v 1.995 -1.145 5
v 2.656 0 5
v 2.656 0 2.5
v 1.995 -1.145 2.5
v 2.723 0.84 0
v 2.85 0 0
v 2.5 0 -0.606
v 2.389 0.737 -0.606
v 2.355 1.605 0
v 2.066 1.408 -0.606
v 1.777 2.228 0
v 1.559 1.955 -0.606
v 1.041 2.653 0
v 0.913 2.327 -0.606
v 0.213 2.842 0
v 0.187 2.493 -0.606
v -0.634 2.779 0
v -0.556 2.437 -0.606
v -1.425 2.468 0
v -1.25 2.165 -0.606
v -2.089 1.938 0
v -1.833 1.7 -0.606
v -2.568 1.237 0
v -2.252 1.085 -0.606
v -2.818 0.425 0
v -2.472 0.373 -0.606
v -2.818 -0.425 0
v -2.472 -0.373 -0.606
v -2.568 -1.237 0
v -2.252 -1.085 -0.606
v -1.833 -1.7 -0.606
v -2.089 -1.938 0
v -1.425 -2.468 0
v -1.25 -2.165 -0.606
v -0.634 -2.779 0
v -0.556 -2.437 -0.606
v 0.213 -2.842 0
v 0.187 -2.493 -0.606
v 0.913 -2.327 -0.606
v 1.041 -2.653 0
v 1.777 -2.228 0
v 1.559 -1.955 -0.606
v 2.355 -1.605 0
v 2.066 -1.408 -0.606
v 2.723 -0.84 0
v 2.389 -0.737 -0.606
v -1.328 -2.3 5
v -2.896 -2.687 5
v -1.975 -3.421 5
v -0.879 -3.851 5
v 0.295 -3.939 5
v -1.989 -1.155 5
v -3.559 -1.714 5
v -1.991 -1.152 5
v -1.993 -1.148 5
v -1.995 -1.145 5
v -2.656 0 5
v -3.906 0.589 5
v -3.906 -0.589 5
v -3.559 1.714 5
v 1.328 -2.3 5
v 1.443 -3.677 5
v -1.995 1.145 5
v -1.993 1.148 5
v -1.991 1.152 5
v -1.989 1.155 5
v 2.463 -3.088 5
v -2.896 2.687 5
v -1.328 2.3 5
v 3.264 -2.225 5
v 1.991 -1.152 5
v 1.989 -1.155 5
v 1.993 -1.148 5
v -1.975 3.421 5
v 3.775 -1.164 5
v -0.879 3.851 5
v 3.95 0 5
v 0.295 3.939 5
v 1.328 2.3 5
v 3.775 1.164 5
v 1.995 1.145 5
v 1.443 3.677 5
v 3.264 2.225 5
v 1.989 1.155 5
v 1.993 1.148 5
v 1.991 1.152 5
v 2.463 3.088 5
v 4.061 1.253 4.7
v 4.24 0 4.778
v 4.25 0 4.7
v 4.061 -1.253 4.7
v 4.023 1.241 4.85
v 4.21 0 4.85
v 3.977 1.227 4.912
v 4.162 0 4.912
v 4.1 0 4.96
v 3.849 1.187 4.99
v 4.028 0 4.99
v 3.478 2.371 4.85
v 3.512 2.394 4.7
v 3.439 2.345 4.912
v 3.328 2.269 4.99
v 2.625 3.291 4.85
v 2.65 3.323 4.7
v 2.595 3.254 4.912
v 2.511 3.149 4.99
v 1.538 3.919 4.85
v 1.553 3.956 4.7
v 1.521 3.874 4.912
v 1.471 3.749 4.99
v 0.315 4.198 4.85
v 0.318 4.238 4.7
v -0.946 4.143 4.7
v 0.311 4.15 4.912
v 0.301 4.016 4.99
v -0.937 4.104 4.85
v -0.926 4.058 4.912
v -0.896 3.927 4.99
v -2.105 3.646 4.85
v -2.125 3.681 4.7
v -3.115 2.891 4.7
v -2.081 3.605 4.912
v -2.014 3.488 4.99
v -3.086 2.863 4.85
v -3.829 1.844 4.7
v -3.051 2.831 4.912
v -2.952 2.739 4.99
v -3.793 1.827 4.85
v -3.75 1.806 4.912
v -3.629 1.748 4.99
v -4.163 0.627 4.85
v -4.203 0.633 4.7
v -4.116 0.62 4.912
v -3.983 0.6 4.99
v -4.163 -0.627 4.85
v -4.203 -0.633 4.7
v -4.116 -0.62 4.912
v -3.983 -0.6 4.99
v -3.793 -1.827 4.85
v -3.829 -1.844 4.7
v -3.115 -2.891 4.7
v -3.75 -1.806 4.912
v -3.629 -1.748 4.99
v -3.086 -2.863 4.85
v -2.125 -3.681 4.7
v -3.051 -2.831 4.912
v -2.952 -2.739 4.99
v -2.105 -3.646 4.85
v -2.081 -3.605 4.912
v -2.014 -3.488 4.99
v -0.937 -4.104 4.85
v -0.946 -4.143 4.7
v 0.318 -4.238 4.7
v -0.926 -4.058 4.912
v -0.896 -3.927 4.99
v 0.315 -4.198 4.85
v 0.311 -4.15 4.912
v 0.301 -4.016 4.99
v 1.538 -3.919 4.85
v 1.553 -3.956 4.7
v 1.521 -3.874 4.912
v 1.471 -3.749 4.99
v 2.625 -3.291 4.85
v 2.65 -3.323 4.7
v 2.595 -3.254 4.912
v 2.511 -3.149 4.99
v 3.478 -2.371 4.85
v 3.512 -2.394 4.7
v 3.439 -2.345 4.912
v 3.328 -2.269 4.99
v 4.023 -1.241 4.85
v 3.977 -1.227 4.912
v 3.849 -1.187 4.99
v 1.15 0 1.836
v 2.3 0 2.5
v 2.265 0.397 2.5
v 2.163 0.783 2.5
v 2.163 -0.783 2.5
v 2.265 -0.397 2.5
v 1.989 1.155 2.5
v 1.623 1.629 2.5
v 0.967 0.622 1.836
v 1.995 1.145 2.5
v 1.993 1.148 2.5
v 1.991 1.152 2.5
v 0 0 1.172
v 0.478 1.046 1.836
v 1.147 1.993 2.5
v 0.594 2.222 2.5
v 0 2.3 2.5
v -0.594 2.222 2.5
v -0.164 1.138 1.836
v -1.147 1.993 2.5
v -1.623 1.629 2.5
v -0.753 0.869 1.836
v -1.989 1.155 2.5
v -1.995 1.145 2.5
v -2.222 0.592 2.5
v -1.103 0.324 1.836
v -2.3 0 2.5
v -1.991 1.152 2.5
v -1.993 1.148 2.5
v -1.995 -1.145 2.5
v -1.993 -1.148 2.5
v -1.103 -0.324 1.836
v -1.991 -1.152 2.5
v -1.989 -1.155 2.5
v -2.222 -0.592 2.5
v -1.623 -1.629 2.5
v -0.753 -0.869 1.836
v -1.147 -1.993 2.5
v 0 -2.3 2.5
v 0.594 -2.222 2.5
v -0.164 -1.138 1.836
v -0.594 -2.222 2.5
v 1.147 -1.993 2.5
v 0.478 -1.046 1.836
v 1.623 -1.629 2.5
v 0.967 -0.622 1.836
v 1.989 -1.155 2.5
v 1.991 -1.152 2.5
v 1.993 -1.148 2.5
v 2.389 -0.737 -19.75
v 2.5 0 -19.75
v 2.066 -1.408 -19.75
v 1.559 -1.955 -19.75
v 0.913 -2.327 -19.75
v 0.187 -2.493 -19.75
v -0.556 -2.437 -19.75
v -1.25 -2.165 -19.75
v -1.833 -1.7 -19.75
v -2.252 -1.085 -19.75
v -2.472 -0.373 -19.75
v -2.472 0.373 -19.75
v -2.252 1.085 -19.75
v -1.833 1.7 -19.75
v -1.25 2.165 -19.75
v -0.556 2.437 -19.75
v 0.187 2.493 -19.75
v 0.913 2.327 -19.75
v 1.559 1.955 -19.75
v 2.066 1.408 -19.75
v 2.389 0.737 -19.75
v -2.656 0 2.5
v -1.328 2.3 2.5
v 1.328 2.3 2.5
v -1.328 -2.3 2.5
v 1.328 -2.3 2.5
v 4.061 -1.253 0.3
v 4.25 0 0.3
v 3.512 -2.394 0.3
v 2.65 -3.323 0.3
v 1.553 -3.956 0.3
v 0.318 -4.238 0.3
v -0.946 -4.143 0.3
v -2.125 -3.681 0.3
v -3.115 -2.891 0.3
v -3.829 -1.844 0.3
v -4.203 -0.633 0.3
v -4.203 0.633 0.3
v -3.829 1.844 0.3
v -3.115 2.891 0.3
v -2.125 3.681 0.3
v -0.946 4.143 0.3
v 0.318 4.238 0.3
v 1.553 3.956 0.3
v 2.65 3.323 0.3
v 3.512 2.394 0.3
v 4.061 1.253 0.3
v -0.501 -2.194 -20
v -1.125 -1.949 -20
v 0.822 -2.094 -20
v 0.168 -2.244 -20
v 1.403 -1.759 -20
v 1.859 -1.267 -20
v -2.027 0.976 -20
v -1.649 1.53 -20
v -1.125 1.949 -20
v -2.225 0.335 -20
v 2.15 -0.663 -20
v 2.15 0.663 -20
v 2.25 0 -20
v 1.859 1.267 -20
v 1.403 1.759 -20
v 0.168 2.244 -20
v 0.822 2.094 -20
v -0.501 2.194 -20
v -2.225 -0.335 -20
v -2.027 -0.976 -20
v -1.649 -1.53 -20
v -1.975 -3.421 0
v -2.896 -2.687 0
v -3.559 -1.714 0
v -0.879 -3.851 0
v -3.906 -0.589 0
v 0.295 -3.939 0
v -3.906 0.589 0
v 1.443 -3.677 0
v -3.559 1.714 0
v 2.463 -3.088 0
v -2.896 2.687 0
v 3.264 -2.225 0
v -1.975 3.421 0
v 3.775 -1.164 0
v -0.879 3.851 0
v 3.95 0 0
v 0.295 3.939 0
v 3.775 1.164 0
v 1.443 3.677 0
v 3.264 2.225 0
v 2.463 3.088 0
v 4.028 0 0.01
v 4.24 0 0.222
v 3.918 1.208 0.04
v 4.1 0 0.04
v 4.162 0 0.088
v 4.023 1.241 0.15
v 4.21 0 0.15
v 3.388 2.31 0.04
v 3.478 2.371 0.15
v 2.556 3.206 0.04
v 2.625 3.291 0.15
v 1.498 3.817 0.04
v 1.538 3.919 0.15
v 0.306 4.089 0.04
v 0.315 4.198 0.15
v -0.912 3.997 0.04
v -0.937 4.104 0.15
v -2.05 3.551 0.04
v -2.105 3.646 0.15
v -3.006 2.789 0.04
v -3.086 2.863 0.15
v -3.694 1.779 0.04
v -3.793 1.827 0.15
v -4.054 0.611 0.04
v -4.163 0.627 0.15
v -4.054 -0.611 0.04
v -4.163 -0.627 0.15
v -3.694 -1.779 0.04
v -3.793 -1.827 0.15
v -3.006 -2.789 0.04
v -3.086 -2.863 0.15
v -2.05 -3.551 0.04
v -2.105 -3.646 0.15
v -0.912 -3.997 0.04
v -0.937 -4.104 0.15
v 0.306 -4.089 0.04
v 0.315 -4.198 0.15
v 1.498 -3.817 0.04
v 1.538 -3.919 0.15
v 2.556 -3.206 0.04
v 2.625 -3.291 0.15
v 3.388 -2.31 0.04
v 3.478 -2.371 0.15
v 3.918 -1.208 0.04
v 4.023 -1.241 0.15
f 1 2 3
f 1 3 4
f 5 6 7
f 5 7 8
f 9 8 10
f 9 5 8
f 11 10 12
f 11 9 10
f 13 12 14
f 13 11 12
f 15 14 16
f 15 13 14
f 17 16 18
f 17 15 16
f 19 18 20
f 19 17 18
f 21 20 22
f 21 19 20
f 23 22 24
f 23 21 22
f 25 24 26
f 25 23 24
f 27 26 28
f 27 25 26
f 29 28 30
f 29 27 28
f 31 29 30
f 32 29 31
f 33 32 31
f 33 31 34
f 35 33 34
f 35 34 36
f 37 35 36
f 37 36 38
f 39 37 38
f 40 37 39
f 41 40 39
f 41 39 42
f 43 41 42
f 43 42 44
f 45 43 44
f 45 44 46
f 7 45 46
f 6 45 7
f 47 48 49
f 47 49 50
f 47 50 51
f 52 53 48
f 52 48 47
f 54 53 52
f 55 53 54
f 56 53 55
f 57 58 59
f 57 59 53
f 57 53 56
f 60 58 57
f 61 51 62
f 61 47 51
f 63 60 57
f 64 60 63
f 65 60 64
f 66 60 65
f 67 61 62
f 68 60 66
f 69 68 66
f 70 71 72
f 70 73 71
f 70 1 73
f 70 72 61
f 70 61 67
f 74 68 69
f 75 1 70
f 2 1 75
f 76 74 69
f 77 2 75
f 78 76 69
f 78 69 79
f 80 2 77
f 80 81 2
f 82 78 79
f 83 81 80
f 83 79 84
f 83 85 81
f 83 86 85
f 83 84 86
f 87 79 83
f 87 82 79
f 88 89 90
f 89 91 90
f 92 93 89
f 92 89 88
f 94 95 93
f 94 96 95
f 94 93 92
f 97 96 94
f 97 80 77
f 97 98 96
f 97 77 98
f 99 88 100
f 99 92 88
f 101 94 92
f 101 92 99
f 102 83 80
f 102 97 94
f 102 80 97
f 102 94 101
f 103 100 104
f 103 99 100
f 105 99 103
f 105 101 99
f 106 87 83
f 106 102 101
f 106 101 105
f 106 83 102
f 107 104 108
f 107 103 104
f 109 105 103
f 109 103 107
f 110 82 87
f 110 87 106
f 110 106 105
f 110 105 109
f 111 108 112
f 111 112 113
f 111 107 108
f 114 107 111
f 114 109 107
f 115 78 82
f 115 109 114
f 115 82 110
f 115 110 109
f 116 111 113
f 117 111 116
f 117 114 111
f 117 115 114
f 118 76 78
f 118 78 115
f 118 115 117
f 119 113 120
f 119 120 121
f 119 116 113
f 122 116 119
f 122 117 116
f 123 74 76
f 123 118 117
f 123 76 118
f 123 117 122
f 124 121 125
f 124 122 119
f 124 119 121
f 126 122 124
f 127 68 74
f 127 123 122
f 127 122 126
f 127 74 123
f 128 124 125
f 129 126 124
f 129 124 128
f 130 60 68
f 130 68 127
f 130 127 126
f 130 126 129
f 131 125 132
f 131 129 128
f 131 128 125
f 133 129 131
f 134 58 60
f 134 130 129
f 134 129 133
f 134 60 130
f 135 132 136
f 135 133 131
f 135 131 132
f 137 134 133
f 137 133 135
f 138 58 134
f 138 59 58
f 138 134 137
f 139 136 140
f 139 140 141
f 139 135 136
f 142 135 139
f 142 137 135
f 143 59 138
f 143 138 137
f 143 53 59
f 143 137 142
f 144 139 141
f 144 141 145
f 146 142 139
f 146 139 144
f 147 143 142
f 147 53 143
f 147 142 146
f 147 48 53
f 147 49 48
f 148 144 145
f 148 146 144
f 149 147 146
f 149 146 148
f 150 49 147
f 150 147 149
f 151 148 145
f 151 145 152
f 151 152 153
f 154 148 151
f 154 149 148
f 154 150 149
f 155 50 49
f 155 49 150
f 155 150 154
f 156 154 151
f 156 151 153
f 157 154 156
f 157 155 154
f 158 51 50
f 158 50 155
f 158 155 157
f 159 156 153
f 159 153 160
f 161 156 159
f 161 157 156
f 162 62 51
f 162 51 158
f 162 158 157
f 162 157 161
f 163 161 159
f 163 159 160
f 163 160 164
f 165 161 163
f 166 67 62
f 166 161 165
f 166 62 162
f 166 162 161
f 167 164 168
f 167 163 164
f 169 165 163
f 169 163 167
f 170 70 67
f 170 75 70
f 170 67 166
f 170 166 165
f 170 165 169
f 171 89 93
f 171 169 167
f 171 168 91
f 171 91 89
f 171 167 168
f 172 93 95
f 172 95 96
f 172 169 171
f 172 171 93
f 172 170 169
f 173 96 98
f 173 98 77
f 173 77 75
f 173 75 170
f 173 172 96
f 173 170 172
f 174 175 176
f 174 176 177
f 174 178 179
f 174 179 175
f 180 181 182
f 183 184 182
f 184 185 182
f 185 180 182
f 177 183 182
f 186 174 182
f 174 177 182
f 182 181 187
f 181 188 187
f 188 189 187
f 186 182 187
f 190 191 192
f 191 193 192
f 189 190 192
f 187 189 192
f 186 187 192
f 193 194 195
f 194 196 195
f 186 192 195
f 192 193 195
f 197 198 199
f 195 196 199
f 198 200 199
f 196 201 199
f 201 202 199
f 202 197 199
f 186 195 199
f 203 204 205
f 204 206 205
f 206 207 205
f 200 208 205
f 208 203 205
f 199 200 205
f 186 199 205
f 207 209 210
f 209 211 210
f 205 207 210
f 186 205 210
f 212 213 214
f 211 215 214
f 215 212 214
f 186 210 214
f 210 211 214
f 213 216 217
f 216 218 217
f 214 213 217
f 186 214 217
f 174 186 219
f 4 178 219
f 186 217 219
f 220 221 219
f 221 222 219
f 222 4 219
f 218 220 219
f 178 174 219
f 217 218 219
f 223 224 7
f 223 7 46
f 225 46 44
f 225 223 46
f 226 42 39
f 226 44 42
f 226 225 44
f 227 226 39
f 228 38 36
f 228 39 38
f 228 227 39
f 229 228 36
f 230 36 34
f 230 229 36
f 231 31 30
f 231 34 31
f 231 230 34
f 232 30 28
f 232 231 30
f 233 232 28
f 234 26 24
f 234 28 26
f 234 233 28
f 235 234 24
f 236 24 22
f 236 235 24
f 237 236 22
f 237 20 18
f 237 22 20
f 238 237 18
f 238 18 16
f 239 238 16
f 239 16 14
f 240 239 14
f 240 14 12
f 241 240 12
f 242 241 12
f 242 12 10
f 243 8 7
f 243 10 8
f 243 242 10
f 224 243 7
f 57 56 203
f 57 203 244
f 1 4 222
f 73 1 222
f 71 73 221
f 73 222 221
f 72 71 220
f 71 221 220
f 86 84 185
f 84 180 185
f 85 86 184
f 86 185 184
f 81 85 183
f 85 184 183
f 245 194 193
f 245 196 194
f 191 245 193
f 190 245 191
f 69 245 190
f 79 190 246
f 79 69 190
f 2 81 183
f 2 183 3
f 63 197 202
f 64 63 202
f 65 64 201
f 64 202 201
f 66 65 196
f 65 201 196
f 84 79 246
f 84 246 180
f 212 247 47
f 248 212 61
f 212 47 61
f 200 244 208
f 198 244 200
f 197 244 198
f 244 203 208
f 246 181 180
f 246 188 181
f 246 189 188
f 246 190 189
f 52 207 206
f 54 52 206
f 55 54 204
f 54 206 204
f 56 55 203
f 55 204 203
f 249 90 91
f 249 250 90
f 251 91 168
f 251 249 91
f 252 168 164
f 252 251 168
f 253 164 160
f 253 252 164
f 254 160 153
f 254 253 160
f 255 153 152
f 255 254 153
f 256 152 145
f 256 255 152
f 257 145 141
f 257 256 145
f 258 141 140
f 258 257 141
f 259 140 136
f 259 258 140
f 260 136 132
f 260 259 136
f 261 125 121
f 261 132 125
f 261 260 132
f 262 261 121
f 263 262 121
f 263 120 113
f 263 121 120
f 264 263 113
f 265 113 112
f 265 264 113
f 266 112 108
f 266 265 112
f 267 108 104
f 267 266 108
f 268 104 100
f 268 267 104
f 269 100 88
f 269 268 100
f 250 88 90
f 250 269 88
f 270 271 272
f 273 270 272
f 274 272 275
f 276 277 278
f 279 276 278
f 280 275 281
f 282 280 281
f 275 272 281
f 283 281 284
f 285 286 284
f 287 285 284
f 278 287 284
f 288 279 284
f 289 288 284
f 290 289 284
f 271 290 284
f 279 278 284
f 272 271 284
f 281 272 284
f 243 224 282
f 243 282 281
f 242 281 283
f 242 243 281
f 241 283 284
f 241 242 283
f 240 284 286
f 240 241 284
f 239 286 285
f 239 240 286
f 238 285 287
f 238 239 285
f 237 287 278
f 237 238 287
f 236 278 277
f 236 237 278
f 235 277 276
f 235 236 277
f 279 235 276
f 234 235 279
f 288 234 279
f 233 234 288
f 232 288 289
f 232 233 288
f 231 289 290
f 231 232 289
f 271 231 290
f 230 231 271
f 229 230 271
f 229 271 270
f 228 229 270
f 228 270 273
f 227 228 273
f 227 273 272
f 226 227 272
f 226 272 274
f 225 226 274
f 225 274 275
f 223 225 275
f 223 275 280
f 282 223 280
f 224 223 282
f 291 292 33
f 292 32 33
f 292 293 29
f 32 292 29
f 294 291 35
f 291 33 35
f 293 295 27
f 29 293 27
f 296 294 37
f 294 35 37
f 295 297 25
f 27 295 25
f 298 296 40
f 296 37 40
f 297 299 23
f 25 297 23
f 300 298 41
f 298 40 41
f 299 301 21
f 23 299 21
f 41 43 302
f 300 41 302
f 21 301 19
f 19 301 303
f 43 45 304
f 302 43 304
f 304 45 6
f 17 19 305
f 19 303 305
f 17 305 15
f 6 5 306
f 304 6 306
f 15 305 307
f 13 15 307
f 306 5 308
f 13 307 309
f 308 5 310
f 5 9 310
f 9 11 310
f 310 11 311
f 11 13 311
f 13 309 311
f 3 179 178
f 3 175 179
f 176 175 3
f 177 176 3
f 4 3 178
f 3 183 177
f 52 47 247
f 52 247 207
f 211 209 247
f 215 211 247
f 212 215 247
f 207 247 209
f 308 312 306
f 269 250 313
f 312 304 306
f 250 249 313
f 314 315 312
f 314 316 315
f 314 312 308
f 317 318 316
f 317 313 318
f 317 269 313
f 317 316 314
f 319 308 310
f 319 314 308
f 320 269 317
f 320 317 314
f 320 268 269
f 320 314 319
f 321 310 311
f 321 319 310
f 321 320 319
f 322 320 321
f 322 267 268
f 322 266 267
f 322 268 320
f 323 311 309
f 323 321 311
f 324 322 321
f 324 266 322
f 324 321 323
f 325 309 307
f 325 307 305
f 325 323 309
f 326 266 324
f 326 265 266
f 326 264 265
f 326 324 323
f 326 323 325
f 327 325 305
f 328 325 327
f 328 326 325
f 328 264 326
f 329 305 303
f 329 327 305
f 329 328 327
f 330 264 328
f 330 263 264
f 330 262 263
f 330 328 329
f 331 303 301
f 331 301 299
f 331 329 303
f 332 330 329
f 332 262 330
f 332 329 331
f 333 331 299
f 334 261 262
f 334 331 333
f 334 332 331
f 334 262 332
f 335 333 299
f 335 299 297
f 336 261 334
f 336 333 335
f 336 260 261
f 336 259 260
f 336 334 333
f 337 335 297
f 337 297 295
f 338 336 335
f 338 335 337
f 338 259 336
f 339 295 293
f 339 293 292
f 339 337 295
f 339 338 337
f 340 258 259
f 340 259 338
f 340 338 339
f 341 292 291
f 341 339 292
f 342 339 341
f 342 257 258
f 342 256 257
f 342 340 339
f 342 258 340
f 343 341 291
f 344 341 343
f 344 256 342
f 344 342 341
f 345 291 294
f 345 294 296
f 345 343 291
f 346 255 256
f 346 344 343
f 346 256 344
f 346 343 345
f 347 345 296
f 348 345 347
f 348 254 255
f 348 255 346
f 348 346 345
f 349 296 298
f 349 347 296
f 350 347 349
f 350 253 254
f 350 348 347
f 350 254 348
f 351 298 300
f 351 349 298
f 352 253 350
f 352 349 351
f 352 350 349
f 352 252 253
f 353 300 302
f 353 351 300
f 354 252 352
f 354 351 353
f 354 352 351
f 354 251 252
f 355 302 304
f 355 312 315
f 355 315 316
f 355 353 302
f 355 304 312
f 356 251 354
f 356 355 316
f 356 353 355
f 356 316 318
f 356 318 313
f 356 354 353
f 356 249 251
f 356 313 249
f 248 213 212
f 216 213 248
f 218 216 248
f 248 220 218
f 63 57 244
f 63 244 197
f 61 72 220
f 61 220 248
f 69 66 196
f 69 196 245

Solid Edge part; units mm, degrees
sketch "Sketch1" plane through (0, 0, 0) normal (0, -1, 0) x (1, 0, 0)
  line L0 (4.25, 5) -> (4.25, 0)
  line L1 (4.25, 0) -> (2.85, 0)
  line L2 (2.85, 0) -> (2.5, -0.6062)
  line L3 (2.5, -0.6062) -> (2.5, -20)
  line L4 (2.5, -20) -> (0, -20)
  line L5 (2.3, 2.5) -> (0, 1.1721)
  line L6 (2.3, 5) -> (2.3, 2.5)
  line L7 (4.25, 5) -> (2.3, 5)
  dimension "D1" = 2.5
  dimension "D2" = 20
  dimension "D3" = 5
revolve "RevolvedProtrusion1" add sketch "Sketch1" angle 360 about axis through (0, 0, -6) along (0, 0, 1)
cosmetic_thread "Thread1" size "M5"
chamfer "Chamfer_1" distance 0.25 angle 45 1 edges at (-2.5, 0, -20)
fillet "Round_1" radius 0.3 2 edges at (-4.25, 0, 0) (-4.25, 0, 5)
sketch "Sketch2" plane through (0, 0, 5) normal (0, 0, 1) x (0, 1, 0)
  line L0 (-2.3, 1.3279) -> (-2.3, -1.3279)
  line L1 (0, -2.6558) -> (-2.3, -1.3279)
  line L2 (2.3, -1.3279) -> (0, -2.6558)
  line L3 (2.3, 1.3279) -> (2.3, -1.3279)
  line L4 (0, 2.6558) -> (2.3, 1.3279)
  line L5 (-2.3, 1.3279) -> (0, 2.6558)
extrude "Cutout1" cut sketch "Sketch2" against normal up to vertex (2.5 mm away)
properties material "Galvanized steel"
